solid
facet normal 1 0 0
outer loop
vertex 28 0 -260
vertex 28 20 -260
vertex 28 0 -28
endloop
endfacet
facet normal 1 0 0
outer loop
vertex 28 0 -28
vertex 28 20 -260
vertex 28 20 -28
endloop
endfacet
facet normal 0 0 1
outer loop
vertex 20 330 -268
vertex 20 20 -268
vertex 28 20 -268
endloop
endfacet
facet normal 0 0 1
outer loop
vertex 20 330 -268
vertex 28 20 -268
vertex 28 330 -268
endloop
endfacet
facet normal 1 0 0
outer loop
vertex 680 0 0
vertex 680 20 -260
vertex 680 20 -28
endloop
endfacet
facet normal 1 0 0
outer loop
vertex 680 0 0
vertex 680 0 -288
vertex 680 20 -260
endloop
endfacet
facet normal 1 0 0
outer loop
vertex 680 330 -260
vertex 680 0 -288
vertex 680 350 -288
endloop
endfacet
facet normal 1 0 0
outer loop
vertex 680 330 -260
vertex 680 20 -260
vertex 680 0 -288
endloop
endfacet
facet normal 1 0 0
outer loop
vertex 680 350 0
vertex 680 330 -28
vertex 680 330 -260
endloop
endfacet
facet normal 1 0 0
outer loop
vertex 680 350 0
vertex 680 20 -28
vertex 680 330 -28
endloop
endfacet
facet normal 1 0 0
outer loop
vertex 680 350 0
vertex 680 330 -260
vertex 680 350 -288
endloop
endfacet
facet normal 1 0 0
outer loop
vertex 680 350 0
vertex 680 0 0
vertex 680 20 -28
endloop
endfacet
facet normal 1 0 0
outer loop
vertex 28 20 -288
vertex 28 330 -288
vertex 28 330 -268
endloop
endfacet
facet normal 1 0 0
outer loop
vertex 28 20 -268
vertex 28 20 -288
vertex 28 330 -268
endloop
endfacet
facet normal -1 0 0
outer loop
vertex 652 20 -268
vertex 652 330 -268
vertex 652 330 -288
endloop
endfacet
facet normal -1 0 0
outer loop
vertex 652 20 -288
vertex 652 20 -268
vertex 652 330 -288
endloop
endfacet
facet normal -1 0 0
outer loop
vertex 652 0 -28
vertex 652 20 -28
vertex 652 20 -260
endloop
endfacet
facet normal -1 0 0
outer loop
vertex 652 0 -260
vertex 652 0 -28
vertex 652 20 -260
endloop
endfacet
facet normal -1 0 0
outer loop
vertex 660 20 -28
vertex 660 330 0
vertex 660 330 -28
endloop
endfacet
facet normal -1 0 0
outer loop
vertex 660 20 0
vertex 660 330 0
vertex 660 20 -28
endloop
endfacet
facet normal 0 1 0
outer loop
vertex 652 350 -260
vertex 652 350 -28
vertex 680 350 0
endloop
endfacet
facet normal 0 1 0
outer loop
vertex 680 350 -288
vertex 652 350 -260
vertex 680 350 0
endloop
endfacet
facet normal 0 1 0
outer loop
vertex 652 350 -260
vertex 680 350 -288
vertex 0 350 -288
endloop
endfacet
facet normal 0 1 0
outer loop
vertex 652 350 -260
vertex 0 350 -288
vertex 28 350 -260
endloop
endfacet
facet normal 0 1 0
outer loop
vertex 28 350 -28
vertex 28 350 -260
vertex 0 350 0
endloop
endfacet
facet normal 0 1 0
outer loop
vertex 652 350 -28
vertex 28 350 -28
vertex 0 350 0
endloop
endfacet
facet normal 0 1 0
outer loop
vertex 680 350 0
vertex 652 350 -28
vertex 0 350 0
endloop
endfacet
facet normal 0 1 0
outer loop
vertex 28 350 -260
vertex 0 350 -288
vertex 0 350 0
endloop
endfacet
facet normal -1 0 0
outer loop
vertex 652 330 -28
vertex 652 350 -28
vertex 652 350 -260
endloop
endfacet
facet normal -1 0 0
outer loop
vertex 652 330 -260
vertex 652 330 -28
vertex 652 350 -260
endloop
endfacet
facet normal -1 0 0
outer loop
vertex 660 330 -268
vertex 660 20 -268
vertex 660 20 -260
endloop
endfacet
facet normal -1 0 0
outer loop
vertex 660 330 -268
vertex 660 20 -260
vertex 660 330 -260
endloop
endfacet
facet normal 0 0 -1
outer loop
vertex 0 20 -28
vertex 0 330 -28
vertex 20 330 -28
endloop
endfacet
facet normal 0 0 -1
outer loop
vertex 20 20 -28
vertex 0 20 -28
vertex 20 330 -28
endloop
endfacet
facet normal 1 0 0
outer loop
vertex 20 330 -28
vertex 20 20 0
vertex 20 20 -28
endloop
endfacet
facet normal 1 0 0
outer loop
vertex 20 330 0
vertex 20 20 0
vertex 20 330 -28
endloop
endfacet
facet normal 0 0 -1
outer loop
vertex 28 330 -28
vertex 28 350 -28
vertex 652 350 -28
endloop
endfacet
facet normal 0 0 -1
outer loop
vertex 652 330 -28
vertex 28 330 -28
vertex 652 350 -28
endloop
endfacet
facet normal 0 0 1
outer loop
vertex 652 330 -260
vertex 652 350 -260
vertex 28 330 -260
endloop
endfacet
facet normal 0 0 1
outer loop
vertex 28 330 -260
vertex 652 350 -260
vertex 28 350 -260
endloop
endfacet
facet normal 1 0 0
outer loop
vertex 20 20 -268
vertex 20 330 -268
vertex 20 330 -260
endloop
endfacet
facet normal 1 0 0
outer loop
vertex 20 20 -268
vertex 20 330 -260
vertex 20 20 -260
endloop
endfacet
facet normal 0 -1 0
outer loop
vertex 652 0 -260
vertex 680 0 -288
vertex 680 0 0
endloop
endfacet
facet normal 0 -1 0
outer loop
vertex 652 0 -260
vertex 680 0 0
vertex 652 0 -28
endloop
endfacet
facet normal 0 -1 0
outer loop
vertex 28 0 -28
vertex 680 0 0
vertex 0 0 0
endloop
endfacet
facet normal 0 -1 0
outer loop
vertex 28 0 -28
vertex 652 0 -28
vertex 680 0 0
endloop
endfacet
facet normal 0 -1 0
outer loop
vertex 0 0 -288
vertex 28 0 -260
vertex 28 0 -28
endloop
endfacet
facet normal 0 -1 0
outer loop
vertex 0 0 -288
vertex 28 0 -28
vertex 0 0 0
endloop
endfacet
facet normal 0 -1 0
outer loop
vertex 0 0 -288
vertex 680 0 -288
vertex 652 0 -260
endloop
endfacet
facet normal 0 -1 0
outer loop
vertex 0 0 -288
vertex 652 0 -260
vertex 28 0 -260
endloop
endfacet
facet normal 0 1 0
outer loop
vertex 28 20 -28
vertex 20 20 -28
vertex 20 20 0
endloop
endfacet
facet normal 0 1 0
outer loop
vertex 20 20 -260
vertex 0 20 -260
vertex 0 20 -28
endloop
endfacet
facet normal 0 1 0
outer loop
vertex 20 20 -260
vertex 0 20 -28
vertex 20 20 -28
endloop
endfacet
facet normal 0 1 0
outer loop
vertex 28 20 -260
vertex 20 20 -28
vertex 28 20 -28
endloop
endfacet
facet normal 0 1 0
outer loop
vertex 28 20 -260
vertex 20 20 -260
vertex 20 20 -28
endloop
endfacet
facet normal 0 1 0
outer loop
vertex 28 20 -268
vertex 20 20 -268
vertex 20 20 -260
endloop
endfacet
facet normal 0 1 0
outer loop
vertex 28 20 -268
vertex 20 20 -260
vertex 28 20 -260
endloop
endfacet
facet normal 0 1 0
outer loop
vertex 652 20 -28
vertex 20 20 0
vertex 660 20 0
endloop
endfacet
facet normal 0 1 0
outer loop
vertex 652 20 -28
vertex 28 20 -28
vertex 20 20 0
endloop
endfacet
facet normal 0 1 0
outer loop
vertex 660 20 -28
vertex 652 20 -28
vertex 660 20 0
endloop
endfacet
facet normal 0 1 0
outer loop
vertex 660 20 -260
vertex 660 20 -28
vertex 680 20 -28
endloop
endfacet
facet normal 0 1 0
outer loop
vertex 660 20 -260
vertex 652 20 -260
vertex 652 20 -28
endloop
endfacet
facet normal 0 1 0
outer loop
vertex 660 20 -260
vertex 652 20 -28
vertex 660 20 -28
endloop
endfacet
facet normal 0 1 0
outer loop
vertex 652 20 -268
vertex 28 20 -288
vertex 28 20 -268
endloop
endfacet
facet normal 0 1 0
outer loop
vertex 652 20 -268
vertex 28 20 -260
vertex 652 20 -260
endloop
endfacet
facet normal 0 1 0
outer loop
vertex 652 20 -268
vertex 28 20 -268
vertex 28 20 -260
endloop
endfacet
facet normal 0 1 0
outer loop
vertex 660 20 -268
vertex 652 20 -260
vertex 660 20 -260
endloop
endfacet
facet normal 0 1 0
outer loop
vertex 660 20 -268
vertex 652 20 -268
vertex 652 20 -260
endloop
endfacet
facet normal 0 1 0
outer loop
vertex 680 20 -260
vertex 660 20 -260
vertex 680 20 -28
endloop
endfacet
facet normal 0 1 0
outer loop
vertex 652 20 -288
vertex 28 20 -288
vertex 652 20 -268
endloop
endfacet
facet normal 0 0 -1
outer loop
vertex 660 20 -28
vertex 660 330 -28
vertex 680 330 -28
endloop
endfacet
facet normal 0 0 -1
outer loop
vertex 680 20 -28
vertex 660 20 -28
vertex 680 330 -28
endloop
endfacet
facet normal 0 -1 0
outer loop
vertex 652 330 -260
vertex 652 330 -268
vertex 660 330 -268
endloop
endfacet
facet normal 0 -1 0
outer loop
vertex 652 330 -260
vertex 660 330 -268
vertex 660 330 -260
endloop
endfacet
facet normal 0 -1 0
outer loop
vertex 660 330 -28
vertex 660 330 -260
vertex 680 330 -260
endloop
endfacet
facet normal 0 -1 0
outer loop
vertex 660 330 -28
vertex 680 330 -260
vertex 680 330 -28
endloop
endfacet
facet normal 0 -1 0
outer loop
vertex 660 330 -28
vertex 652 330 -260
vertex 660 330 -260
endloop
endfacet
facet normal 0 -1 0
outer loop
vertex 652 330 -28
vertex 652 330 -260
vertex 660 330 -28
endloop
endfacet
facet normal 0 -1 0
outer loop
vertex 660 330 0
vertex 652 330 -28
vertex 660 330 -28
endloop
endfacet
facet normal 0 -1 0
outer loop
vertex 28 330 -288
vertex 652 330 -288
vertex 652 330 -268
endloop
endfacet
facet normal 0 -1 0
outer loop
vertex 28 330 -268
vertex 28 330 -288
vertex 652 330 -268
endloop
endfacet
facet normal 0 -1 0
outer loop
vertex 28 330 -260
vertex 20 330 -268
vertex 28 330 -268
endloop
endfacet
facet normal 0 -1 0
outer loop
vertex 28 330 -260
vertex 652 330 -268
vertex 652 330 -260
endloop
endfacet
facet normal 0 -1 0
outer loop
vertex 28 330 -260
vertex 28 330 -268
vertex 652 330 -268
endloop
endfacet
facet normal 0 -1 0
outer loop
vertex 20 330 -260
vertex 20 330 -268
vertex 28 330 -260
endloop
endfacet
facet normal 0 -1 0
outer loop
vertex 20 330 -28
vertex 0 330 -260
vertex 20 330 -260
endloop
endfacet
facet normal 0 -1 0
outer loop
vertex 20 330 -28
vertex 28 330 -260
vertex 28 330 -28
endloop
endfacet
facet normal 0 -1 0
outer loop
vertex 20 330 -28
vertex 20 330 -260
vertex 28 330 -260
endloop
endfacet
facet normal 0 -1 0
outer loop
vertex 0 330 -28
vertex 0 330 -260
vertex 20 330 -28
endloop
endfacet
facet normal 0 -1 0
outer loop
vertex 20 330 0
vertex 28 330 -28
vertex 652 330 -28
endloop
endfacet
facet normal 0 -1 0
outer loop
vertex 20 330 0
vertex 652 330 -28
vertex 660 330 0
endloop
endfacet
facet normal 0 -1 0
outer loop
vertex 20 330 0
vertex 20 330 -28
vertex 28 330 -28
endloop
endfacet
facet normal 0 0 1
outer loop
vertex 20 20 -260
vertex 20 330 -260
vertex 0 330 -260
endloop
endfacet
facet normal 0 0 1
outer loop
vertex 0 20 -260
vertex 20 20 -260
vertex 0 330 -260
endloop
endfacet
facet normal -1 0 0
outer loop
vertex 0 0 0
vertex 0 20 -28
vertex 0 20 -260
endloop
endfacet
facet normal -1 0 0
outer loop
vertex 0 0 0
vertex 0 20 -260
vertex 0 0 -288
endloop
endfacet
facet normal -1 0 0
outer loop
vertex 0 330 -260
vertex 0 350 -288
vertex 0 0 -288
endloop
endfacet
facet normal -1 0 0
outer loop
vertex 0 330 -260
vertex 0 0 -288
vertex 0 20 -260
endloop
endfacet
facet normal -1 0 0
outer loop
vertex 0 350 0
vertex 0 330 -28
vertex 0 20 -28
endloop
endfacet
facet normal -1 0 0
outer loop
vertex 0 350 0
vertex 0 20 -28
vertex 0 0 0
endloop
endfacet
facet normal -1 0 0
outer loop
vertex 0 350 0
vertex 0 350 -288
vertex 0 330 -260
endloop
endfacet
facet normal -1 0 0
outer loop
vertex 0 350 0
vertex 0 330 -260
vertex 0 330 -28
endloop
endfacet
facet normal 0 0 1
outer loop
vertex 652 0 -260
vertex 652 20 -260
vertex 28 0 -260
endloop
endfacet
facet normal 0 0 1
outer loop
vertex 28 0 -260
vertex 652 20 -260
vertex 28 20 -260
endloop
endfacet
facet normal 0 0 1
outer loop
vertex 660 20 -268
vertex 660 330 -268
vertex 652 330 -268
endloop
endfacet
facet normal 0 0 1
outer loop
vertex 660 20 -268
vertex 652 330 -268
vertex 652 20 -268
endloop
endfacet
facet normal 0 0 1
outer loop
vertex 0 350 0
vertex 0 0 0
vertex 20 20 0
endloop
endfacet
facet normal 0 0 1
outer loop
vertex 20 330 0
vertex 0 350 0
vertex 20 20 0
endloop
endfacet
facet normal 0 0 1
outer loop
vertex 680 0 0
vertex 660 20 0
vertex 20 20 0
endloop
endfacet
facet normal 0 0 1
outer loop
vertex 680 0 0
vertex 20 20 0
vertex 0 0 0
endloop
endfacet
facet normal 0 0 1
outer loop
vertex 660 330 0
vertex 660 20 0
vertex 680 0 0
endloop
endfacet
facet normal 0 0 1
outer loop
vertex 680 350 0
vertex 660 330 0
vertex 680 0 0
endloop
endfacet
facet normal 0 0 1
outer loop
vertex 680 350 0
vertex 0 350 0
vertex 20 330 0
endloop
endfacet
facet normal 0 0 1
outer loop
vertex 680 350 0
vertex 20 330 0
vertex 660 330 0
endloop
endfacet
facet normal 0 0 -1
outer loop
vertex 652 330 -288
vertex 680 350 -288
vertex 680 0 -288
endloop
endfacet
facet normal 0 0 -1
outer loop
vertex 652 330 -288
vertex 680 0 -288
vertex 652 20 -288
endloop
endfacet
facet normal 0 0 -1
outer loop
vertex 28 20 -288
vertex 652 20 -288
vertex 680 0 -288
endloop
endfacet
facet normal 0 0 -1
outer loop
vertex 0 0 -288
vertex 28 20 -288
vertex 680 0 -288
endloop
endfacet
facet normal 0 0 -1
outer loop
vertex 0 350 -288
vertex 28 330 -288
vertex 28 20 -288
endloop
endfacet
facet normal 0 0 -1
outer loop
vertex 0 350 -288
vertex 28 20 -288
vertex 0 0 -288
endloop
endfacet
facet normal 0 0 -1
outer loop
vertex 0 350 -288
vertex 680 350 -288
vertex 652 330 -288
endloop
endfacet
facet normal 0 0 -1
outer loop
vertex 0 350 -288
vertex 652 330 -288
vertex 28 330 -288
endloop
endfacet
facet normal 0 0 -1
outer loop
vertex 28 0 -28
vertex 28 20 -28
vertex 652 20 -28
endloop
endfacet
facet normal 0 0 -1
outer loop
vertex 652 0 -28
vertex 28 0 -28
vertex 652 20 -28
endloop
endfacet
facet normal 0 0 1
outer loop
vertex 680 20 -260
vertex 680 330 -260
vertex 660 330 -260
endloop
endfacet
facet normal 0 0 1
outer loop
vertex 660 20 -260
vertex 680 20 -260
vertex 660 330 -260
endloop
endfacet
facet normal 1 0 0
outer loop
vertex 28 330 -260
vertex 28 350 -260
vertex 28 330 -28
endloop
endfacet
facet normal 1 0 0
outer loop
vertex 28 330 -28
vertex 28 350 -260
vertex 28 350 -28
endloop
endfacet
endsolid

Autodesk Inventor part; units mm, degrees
ref_plane "YZ Plane" through (0, 0, 0) normal (1, 0, 0) x (0, 1, 0)
sketch "Sketch1" plane through (0, 0, 0) normal (0, 0, 1) x (1, 0, 0)
  line L0 (0, 0) -> (680, 0)
  line L1 (680, 0) -> (680, 350)
  line L2 (680, 350) -> (0, 350)
  line L3 (0, 350) -> (0, 0)
  line L4 (660, 20) -> (20, 20)
  line L5 (20, 20) -> (20, 330)
  line L6 (20, 330) -> (660, 330)
  line L7 (660, 330) -> (660, 20)
  dimension "d0" = 680
  dimension "d1" = 350
  dimension "d2" = 20
extrude "Extrusion1" add sketch "Sketch1" against normal blind 28
sketch "Sketch2" plane through (680, 0, 0) normal (1, 0, 0) x (0, 0, -1)
  line L0 (0, 350) -> (28, 350) projected
  line L1 (28, 350) -> (288, 350)
  line L2 (288, 350) -> (288, 0)
  line L3 (28, 350) -> (28, 0) projected
  line L4 (288, 0) -> (28, 0)
  line L5 (28, 330) -> (268, 330)
  line L6 (268, 330) -> (268, 20)
  line L7 (268, 20) -> (28, 20)
  point P0 (0, 0)
  dimension "d5" = 260
  dimension "d6" = 350
  dimension "d7" = 20
  dimension "d8" = 20
  dimension "d9" = 310
extrude "Extrusion2" add sketch "Sketch2" against normal blind 28 contours L1 L2 L4 L3 L7 L6 L5
ref_plane "Work Plane1" through (0, 0, -144) normal (0, 0, 1) x (1, 0, 0)
mirror "Mirror1" about plane through (0, 0, -144) normal (0, 0, 1) of "Extrusion1"
ref_plane "Work Plane2" through (340, 0, 0) normal (1, 0, 0) x (0, 0, -1)
mirror "Mirror2" about plane through (340, 0, 0) normal (1, 0, 0) of "Extrusion2"
sketch "Sketch4" plane through (0, 0, 0) normal (0, -1, 0) x (1, 0, 0)
  line L0 (0, -144) -> (680, -144)
  line L1 (680, -28) -> (680, -260) projected
  line L2 (680, -288) -> (0, -288) projected
  line L3 (0, -80.5) -> (680, -80.5)
  line L4 (652, -28) -> (28, -28) projected
  point P0 (0, 0)
  dimension "d15" = 144
  dimension "d16" = 52.5
properties part number "OuterShell" material "Steel, Mild"
